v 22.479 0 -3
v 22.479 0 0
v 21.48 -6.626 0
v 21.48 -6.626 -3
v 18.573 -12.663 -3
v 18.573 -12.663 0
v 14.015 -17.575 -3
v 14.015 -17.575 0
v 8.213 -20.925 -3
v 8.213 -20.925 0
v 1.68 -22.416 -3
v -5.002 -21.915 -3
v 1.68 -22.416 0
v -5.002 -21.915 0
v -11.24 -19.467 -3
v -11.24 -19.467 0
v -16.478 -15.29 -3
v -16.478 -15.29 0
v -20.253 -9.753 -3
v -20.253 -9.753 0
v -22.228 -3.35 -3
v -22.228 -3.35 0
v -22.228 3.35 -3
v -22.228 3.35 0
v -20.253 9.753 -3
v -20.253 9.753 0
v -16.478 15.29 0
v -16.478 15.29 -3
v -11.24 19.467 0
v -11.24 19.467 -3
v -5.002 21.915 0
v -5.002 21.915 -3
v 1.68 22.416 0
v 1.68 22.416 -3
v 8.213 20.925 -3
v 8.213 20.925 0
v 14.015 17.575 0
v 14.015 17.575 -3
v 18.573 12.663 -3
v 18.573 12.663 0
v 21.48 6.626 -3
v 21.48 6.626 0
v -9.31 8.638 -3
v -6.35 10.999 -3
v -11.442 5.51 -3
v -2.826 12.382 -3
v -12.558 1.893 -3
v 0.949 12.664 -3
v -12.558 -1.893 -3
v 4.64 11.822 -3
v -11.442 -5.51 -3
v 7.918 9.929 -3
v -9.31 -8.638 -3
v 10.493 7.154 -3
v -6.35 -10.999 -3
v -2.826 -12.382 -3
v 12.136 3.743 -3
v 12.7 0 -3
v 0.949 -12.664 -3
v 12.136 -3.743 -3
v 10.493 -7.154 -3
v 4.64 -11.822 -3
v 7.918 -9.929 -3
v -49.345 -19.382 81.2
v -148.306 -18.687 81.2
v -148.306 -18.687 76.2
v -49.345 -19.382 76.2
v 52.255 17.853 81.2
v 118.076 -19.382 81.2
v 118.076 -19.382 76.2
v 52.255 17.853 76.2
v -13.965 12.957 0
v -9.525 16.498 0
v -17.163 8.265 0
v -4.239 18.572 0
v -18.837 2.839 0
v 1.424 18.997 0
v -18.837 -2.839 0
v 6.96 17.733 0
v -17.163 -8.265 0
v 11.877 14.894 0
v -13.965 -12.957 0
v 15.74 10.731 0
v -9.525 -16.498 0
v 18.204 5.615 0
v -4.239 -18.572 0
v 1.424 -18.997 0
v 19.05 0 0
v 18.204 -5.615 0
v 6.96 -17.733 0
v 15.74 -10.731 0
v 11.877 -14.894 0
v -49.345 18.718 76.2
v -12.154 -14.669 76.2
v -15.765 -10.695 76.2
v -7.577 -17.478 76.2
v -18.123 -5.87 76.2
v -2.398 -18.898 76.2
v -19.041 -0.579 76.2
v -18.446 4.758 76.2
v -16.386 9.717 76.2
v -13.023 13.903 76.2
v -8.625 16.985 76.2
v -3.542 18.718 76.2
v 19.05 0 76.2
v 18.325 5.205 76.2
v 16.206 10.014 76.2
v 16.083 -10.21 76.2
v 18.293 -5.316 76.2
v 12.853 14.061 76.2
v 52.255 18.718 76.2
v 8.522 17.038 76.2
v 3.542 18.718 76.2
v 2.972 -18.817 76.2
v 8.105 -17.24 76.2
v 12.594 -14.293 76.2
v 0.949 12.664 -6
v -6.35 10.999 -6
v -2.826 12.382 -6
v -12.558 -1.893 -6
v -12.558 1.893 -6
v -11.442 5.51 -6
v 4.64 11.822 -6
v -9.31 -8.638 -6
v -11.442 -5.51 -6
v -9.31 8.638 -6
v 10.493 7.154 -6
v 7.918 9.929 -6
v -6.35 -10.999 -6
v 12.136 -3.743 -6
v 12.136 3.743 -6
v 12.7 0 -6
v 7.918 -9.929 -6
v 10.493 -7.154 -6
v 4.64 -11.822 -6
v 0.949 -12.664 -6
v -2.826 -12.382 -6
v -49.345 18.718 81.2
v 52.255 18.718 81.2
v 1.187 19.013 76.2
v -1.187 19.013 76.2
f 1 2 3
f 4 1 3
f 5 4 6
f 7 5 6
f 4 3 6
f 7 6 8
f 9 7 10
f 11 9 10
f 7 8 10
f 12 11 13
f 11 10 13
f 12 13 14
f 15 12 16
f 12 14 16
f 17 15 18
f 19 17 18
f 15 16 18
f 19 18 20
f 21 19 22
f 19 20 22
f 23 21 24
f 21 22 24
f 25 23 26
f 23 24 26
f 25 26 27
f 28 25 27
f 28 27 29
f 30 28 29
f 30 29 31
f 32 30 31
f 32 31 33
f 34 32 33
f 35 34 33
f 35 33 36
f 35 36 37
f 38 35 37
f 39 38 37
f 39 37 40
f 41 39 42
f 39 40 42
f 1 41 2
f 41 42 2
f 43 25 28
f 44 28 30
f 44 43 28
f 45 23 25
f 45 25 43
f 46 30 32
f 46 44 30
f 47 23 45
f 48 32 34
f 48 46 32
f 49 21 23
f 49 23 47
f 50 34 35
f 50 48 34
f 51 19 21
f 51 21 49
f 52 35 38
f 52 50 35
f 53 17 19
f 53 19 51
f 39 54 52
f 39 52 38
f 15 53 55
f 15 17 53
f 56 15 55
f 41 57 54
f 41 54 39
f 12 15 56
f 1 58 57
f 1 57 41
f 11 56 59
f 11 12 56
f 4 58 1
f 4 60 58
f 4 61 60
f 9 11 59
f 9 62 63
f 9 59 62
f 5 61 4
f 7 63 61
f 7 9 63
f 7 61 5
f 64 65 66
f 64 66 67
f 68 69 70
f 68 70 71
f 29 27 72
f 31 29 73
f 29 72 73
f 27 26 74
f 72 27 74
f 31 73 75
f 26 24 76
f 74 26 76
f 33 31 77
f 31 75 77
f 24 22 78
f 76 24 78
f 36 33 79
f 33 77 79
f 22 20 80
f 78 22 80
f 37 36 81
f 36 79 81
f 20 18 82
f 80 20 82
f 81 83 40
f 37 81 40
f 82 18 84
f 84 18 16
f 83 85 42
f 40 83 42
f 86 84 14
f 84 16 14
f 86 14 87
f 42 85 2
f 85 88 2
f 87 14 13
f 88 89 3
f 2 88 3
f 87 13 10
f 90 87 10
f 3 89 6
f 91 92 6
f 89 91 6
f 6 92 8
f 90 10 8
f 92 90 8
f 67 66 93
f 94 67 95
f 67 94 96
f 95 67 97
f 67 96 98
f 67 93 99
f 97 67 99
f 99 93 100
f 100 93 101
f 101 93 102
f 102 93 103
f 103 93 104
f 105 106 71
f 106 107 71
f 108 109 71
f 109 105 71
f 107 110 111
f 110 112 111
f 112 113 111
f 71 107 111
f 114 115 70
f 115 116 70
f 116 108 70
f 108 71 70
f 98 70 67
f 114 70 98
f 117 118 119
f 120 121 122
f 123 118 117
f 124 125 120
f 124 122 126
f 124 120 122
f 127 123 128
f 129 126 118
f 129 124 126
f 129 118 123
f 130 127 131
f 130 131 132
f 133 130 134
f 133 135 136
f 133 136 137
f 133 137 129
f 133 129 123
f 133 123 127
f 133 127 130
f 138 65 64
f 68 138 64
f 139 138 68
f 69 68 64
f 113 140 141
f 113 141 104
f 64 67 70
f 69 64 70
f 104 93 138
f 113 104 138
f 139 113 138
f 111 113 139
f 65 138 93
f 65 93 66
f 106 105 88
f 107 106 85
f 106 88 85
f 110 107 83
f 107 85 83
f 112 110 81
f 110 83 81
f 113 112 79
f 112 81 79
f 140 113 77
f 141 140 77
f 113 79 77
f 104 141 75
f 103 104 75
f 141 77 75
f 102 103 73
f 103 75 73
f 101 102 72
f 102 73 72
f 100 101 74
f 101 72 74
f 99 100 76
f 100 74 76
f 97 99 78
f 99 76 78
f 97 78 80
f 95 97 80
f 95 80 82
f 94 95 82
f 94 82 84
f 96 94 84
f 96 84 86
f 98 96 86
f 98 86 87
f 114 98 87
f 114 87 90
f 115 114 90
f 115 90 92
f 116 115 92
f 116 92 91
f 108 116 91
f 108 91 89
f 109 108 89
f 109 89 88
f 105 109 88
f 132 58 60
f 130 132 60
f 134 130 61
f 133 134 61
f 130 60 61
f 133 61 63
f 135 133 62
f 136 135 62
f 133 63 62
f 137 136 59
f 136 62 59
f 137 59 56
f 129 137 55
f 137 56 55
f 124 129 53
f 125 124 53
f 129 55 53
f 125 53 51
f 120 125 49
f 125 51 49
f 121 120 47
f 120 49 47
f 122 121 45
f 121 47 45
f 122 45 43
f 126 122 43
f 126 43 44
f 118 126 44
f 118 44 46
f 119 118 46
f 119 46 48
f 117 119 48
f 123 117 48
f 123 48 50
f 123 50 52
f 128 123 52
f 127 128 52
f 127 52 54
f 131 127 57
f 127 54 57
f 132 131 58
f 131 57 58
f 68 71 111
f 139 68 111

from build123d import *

# Parameters (mm, degrees)
F0_R     = 19.05
F1_DEPTH = 76.2
F2_W     = 101.6
F2_H     = 38.1
F3_DEPTH = 5
F4_R     = 22.479
F4_R_2   = 19.05
F5_DEPTH = 3
F6_R     = 12.7
F7_DEPTH = 3
F9_DEPTH = 5


with BuildPart() as f1:
    # F0 (on Top) → F1 (new body)
    with BuildSketch(Plane.XY):
        Circle(F0_R)
    extrude(amount=F1_DEPTH)

    # F2 (on face) → F3 (join)
    with BuildSketch(Plane.XY.offset(76.2)):
        with Locations((1.4545911372, -0.3322677247)):
            Rectangle(F2_W, F2_H)
    extrude(amount=F3_DEPTH)

    # F4 (on face) → F5 (join)
    with BuildSketch(Plane(origin=(0, 0, 0), x_dir=(1, 0, 0), z_dir=(0, 0, -1))):
        Circle(F4_R)
        Circle(F4_R_2, mode=Mode.SUBTRACT)
        Circle(F4_R_2)
    extrude(amount=F5_DEPTH)

    # F6 (on face) → F7 (join)
    with BuildSketch(Plane(origin=(0, 0, -3), x_dir=(1, 0, 0), z_dir=(0, 0, -1))):
        Circle(F6_R)
    extrude(amount=F7_DEPTH)

    # F8 (on face) → F9 (join)
    with BuildSketch(Plane.XY.offset(81.2)):
        Polygon((-49.3454088628, -19.3822677247), (-49.3454088628, 18.7177322753), (-148.3056545258, -18.6870153993), align=None)
        Polygon((118.0756762624, -19.3822677247), (52.2545911372, 17.8529117256), (52.2545911372, -19.3822677247), align=None)
    extrude(amount=-F9_DEPTH)


solid = f1.part
